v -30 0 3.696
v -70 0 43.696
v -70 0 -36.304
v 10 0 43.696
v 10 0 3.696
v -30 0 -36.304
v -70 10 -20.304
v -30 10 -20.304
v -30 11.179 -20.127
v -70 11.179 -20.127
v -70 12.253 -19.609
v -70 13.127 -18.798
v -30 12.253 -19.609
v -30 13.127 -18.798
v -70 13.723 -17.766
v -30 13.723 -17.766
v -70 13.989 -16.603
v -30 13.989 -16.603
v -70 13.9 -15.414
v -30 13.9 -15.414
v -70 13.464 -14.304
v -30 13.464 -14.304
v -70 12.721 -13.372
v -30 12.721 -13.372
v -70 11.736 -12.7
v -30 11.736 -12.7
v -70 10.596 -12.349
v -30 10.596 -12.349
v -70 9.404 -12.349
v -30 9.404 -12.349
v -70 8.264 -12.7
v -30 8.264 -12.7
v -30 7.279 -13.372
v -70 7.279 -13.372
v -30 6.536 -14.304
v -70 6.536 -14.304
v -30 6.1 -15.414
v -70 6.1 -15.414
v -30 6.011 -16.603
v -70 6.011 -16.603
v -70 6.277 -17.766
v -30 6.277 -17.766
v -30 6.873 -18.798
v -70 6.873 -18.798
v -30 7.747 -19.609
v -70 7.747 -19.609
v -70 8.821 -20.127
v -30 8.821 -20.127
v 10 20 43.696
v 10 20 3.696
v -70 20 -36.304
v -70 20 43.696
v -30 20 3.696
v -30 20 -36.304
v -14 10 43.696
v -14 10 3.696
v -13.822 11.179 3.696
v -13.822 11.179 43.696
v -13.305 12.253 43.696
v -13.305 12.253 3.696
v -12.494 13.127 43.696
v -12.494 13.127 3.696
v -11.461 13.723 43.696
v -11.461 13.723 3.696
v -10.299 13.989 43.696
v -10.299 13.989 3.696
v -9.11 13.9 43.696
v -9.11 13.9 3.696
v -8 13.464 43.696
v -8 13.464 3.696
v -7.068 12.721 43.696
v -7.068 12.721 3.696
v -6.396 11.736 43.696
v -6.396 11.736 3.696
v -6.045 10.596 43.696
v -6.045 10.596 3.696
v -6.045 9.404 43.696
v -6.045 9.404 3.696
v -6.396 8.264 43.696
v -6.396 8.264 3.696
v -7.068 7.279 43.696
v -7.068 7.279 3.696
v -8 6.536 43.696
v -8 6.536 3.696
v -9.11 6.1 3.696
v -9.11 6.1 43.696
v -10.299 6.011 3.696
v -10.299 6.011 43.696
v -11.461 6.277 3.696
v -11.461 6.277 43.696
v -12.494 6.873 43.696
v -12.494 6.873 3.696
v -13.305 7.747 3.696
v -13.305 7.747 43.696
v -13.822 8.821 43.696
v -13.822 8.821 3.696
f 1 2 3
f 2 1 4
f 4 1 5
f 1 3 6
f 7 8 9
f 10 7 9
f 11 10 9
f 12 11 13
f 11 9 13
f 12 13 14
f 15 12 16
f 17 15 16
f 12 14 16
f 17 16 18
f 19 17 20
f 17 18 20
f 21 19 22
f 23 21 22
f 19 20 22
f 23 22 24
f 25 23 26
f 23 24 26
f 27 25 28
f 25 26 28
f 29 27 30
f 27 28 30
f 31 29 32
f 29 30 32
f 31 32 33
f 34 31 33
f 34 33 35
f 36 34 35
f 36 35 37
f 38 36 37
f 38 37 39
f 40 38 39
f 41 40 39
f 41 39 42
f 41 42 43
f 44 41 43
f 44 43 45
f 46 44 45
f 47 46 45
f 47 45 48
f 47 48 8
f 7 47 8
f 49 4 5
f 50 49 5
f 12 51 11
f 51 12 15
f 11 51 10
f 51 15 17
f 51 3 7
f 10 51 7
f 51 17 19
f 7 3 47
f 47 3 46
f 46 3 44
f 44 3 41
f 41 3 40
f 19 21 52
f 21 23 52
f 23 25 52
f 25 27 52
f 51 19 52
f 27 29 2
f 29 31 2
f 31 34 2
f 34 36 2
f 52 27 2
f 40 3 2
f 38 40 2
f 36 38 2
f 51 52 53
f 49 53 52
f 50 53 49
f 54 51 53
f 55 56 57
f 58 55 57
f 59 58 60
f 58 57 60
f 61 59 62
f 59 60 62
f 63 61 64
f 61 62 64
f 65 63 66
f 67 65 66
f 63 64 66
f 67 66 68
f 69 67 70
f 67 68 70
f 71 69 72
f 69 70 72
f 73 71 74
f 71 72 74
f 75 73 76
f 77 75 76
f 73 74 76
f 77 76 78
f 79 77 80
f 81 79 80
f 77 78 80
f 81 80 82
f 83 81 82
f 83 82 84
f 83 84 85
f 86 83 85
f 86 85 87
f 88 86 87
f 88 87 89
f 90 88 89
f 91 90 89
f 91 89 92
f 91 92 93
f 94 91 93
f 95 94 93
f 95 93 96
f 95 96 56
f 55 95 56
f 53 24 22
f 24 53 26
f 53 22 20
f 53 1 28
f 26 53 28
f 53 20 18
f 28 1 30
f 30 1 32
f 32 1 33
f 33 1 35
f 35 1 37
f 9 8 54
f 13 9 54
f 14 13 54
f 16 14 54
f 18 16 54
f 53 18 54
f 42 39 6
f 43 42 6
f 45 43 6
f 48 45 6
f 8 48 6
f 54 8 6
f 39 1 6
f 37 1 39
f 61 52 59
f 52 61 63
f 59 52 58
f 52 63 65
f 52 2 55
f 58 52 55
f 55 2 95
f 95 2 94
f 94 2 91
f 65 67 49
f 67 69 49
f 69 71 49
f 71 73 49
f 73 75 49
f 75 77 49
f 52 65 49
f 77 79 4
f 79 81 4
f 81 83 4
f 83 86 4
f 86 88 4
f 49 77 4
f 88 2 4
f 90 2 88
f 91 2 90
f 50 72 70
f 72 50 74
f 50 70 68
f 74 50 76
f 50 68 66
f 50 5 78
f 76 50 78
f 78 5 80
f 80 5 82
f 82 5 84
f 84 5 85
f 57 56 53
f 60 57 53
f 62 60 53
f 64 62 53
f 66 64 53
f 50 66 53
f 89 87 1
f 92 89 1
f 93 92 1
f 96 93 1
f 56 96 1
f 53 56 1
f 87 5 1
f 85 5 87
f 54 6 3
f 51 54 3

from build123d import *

# Parameters (mm, degrees)
RESSALTO_EXTRUS_O1_DEPTH = 20
ESBO_O3_R                = 4
CORTE_EXTRUS_O1_DEPTH    = 63.524475359
ESBO_O4_R                = 4
CORTE_EXTRUS_O2_DEPTH    = 84.066238629


with BuildPart() as part:
    # Esboço1 → Ressalto-extrusão1 (new body)
    with BuildSketch(Plane(origin=(0, 0, 0), x_dir=(1, 0, 0), z_dir=(0, 1, 0))):
        Polygon((-70, 36.304347826), (-70, -43.695652174), (10, -43.695652174), (10, -3.695652174), (-30, -3.695652174), (-30, 36.304347826), align=None)
    extrude(amount=RESSALTO_EXTRUS_O1_DEPTH)

    # Esboço3 → Corte-extrusão1 (cut, through all)
    with BuildSketch(Plane(origin=(-30, 0, 0), x_dir=(0, 0, -1), z_dir=(1, 0, 0))):
        with Locations((16.304347826, 10)):
            Circle(ESBO_O3_R)
    extrude(amount=-CORTE_EXTRUS_O1_DEPTH, mode=Mode.SUBTRACT)

    # Esboço4 → Corte-extrusão2 (cut, through all)
    with BuildSketch(Plane(origin=(0, 0, 3.695652174), x_dir=(-1, 0, 0), z_dir=(0, 0, -1))):
        with Locations((10, 10)):
            Circle(ESBO_O4_R)
    extrude(amount=-CORTE_EXTRUS_O2_DEPTH, mode=Mode.SUBTRACT)


solid = part.part
